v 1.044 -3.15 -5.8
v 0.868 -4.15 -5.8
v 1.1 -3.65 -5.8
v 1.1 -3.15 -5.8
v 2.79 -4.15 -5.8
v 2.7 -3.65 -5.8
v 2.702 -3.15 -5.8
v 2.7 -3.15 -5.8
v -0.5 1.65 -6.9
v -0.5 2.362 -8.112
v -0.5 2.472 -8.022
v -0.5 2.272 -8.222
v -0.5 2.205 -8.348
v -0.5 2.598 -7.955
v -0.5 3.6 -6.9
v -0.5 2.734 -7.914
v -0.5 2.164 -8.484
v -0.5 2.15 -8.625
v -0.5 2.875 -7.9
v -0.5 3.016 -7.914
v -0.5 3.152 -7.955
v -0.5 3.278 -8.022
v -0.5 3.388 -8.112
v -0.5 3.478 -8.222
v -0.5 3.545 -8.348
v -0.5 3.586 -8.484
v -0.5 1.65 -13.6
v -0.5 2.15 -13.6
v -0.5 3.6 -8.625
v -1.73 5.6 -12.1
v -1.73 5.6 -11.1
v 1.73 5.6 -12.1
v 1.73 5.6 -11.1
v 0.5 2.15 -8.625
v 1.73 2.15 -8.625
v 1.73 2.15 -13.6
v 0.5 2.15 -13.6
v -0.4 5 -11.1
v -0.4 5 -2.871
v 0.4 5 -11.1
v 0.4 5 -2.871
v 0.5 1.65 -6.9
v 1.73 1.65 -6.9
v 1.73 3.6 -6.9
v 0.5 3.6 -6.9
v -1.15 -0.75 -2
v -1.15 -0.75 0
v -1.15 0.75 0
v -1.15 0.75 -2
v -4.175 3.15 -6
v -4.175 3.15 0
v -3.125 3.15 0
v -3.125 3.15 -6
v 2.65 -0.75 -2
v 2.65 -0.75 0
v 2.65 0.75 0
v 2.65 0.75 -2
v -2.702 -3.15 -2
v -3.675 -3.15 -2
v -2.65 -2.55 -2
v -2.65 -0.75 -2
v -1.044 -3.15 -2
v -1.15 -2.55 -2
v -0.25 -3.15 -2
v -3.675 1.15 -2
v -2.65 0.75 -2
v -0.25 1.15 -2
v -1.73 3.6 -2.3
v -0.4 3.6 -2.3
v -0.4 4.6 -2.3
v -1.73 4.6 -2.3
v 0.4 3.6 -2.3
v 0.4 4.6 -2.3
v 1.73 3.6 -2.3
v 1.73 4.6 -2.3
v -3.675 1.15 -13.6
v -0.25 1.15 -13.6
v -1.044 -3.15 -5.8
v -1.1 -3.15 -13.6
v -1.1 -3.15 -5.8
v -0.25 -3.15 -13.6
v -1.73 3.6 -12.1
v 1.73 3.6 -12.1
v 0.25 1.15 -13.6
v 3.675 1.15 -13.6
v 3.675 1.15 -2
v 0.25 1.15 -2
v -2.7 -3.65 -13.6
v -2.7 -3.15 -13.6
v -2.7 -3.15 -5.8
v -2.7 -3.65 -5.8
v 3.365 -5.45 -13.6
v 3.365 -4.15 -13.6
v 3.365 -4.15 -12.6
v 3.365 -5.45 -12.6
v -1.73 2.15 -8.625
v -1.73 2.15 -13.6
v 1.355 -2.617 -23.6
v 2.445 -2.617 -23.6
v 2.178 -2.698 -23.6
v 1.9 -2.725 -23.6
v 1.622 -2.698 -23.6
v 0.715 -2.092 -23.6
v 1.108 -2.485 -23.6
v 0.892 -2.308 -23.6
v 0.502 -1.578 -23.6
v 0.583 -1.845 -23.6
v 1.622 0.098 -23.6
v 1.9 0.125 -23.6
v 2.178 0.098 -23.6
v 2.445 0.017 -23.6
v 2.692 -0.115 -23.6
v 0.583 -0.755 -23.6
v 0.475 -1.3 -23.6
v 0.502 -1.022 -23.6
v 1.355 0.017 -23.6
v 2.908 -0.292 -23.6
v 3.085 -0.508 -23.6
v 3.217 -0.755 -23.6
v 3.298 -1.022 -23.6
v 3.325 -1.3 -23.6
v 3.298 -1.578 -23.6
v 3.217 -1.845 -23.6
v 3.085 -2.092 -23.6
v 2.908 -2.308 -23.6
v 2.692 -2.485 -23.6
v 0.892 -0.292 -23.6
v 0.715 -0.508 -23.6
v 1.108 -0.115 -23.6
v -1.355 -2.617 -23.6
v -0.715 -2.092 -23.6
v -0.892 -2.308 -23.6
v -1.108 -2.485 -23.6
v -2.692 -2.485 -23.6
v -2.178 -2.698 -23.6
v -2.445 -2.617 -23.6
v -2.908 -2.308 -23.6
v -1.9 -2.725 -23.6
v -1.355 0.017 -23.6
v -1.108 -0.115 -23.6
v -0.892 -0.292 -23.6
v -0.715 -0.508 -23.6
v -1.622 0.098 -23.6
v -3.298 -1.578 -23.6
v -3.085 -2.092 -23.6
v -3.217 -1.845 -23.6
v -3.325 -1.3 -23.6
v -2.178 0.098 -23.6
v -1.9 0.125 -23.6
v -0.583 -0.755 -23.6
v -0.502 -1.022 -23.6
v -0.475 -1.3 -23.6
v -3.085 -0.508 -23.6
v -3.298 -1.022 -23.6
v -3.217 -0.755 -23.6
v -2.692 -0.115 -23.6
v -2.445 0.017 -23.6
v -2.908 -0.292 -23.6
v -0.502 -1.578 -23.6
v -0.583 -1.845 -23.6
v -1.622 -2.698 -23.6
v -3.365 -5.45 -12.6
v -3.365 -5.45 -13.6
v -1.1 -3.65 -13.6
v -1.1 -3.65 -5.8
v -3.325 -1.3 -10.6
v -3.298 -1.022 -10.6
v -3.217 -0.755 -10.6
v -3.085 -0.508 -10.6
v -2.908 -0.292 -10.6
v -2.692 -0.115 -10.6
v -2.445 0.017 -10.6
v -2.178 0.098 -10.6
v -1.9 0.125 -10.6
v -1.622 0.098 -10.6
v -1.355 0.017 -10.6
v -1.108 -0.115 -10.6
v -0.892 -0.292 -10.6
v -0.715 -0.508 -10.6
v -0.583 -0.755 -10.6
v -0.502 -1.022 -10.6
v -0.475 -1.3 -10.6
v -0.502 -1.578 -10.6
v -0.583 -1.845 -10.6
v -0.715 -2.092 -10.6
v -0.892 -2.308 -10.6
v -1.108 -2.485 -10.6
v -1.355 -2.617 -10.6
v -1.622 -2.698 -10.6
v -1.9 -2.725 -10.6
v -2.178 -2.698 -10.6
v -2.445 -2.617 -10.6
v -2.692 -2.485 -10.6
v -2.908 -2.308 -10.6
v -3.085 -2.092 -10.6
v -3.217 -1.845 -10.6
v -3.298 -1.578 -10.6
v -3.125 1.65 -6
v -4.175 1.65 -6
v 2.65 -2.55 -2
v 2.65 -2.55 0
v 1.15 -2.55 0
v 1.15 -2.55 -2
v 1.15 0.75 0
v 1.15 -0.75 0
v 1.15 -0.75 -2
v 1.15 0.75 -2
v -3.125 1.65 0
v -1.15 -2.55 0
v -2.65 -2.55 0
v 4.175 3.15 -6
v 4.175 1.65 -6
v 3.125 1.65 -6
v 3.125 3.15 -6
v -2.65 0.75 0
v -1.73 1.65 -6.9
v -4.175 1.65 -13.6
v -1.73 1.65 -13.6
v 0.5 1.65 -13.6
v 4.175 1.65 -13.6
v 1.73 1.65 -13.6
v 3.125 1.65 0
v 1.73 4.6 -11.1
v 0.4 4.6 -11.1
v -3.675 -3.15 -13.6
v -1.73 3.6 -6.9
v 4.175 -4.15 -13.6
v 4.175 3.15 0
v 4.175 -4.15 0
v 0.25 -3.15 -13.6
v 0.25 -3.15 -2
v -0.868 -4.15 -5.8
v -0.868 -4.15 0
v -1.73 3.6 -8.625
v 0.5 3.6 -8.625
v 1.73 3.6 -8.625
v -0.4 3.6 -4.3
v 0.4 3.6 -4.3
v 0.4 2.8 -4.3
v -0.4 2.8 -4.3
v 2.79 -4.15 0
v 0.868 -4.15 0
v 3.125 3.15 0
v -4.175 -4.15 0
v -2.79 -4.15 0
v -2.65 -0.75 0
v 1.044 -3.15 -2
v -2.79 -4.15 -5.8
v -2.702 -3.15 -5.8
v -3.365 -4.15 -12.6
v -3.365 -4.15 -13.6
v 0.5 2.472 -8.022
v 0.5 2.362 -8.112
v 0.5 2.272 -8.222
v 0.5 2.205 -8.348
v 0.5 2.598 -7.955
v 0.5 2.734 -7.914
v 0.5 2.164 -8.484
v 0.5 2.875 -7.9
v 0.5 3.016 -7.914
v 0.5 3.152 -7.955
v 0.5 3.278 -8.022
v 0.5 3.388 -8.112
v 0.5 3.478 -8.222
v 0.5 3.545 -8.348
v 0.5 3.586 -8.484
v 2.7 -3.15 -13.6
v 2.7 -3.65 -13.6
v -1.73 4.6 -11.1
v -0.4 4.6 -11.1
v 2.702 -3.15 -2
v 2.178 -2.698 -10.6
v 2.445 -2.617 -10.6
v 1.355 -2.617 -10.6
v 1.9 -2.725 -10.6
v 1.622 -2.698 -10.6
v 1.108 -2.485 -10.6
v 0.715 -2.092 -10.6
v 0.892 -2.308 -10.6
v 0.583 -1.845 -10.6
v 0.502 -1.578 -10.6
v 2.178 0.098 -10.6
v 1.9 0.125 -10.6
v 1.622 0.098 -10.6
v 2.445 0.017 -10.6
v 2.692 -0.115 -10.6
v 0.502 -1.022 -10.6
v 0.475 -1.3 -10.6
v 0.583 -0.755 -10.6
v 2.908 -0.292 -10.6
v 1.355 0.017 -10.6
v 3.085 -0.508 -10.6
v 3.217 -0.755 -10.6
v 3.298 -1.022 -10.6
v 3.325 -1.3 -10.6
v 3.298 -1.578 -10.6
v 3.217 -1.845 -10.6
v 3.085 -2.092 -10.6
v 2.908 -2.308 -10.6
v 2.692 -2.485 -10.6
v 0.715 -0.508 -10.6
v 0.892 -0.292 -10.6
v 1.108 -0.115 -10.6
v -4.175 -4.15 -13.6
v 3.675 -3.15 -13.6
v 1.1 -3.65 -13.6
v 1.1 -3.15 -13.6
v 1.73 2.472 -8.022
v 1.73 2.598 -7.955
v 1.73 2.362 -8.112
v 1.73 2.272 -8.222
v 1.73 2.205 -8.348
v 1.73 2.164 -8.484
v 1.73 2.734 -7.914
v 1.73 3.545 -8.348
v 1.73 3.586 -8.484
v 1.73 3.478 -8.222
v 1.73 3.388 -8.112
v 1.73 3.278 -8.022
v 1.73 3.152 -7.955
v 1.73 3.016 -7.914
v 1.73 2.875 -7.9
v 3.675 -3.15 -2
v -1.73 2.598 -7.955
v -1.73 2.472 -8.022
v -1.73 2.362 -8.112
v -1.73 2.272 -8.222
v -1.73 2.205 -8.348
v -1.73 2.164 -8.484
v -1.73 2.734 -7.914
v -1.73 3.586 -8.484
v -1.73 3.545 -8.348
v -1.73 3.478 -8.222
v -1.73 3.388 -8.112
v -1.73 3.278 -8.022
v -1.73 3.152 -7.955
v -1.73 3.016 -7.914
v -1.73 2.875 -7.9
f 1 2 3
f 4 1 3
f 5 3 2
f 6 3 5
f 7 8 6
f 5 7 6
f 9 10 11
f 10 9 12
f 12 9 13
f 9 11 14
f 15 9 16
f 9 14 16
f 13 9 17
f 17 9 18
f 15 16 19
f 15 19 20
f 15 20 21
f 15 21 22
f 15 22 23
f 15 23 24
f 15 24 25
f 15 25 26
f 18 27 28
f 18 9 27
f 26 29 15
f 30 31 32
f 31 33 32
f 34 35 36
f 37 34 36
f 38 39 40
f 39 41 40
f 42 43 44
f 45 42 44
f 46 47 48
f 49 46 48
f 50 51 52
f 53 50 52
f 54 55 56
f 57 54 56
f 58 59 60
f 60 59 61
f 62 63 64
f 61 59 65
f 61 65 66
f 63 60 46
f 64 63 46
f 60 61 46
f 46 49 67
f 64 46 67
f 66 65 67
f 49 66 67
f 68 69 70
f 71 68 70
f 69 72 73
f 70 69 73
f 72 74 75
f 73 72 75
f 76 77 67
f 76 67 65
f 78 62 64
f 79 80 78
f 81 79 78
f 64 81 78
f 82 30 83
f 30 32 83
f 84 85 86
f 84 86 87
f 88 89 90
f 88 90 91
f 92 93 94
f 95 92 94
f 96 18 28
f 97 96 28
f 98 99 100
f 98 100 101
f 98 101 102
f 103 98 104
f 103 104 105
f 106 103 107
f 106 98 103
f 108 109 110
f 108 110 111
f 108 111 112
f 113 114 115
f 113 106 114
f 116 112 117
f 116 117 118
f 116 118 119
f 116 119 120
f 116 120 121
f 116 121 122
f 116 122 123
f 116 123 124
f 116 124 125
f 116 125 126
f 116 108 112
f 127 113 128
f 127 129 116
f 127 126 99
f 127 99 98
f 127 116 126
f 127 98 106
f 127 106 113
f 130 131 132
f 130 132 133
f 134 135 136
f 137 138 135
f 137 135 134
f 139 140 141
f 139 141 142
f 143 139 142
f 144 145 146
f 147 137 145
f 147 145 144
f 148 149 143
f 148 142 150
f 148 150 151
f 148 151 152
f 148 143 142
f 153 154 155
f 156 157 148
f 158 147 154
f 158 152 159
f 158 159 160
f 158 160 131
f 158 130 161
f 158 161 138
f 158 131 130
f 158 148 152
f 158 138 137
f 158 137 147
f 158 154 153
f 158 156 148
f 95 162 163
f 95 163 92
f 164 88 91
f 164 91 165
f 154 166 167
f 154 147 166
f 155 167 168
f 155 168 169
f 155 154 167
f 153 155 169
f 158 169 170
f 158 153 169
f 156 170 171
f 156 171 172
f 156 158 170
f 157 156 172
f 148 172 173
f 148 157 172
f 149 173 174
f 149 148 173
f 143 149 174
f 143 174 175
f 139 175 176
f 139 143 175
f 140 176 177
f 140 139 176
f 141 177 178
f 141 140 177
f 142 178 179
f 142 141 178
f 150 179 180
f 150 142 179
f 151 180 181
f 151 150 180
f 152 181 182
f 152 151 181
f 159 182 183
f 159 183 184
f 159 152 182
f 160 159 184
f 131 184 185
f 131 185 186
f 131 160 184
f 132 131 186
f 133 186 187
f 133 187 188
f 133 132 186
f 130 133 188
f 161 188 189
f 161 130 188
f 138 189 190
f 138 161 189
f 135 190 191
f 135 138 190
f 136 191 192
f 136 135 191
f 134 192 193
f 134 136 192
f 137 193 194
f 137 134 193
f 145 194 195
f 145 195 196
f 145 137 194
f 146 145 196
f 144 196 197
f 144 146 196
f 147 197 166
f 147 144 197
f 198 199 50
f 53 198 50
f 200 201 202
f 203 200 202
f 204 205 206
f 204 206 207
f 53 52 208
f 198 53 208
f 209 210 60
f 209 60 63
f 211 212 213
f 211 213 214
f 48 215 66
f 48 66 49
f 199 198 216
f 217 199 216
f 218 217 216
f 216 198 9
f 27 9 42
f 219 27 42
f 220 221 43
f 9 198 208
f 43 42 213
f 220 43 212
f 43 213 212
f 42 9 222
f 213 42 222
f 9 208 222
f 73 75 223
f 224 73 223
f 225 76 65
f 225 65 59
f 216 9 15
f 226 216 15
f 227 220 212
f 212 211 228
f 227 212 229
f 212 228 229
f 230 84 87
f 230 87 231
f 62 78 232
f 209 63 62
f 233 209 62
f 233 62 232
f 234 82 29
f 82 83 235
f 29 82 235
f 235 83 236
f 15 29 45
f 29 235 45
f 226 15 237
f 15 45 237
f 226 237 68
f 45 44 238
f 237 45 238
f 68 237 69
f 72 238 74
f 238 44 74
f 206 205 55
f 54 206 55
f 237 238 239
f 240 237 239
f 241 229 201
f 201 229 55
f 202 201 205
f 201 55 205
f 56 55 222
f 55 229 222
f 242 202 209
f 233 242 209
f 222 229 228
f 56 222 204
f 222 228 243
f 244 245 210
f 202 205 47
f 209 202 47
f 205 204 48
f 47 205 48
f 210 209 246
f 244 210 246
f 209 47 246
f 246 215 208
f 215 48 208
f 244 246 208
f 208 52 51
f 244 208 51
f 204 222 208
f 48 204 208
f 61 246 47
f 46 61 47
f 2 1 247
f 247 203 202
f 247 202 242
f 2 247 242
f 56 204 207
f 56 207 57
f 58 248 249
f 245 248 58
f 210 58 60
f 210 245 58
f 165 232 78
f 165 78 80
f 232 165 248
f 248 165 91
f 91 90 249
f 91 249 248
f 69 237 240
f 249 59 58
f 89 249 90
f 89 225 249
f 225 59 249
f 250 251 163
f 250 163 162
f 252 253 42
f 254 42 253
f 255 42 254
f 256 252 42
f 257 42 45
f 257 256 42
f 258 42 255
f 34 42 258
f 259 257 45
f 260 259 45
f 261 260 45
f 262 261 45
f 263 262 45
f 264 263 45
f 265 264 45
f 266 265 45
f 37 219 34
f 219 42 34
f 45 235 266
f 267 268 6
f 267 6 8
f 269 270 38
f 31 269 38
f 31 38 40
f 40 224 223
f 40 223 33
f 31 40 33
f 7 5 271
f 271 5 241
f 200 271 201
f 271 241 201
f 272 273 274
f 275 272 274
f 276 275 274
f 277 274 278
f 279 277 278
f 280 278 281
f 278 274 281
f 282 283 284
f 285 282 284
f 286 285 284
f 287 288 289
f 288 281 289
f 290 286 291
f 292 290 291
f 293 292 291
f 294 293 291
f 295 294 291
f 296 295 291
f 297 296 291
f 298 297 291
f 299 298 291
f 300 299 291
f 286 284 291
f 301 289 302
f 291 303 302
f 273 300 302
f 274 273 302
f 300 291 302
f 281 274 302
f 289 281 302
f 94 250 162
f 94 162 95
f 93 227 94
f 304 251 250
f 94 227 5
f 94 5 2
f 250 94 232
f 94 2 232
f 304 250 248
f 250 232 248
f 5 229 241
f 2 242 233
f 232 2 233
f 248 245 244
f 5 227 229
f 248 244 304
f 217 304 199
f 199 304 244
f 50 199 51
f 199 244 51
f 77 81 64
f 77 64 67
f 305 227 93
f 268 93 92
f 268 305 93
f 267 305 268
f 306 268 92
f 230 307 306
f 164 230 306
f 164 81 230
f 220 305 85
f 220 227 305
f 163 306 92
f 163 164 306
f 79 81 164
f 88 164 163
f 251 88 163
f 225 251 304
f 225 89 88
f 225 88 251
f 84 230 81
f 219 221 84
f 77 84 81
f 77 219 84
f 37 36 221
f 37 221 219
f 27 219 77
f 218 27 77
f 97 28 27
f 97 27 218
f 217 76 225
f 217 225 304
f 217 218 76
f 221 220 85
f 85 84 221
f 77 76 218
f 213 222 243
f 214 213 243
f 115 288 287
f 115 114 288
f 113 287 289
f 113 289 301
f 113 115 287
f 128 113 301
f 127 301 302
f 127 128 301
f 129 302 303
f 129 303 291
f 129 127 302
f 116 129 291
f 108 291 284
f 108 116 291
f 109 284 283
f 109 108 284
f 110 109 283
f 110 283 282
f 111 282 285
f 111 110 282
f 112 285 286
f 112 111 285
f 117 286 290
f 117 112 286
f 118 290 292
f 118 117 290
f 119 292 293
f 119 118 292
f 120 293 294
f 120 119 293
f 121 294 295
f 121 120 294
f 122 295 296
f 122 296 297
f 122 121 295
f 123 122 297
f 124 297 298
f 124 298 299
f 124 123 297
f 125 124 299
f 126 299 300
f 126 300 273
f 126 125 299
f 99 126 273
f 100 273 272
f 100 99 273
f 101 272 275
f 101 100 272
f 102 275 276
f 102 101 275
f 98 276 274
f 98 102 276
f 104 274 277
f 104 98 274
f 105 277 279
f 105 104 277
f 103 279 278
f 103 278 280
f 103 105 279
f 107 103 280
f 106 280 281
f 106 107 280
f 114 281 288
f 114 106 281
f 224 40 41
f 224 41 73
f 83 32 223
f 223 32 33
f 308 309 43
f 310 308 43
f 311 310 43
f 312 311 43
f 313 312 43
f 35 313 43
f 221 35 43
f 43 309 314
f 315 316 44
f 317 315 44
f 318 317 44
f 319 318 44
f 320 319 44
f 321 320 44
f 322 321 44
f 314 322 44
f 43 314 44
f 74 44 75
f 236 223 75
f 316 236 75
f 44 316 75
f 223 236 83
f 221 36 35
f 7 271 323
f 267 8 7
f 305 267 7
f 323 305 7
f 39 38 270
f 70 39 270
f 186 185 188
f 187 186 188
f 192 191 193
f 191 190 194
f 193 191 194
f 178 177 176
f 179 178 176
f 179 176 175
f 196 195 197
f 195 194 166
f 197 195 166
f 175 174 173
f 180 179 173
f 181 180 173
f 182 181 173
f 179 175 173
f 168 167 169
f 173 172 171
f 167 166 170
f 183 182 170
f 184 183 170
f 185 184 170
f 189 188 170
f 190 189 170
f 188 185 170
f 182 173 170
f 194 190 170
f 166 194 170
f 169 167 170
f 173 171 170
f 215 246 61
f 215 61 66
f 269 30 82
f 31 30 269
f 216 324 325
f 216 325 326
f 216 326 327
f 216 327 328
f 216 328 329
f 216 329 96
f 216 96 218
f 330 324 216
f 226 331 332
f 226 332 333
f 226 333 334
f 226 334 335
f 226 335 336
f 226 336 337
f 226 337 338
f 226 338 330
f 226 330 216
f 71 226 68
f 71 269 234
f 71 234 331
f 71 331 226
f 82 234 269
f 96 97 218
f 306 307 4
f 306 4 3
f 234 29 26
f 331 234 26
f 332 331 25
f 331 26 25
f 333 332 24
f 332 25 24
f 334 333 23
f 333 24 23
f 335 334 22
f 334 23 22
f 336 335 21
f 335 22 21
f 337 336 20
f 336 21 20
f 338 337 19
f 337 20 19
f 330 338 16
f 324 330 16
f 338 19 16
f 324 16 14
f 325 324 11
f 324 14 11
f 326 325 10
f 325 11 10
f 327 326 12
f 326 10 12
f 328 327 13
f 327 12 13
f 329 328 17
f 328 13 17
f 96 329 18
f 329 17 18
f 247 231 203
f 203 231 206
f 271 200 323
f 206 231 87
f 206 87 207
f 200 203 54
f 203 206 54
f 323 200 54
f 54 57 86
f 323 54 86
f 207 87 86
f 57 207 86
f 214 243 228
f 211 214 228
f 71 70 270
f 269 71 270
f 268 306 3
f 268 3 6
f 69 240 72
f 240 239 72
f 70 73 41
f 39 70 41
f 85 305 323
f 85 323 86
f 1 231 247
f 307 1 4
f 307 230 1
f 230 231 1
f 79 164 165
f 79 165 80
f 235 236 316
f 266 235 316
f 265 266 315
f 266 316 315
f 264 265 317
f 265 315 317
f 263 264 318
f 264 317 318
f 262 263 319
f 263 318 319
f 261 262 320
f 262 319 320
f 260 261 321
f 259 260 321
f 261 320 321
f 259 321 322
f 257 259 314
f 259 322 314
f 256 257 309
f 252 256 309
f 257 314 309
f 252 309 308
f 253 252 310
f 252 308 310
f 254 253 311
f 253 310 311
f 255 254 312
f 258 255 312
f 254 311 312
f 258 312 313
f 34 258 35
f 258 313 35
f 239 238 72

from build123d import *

# Parameters (mm, degrees)
ESQUISSE1_W               = 1.5
ESQUISSE1_H               = 1.5
BOSS_EXTRU_1_DEPTH        = 13.6
BOSS_EXTRU_2_DEPTH        = 1.73
BOSS_EXTRU_3_DEPTH        = 0.4
BOSS_EXTRU_4_DEPTH        = 0.4
ESQUISSE5_W               = 1
ESQUISSE5_H               = 1.95
ENL_V_MAT_EXTRU_1_DEPTH   = 6.7
ESQUISSE6_W               = 6.73
ESQUISSE6_H               = 1
BOSS_EXTRU_5_DEPTH        = 1.3
ESQUISSE8_W               = 7.6
ESQUISSE8_H               = 1.5
ENL_V_MAT_EXTRU_3_DEPTH   = 1.1
ENL_V_MAT_EXTRU_2_DEPTH   = 11.6
ENL_V_MAT_EXTRU_4_DEPTH   = 5.8
ESQUISSE11_R              = 1.425
BOSS_EXTRU_6_DEPTH        = 10
BOSS_EXTRU_6_DEPTH_BACK   = 3
BOSS_EXTRU_6_2_DEPTH      = 10
BOSS_EXTRU_6_2_DEPTH_BACK = 3


with BuildPart() as part:
    # Esquisse1 → Boss.-Extru.1 (new body)
    with BuildSketch(Plane.XY):
        Polygon((-4.175, 3.15), (-3.125, 3.15), (-3.125, 1.65), (3.125, 1.65), (3.125, 3.15), (4.175, 3.15), (4.175, -4.15), (-4.175, -4.15), align=None)
        with Locations((-1.9, 0)):
            Rectangle(ESQUISSE1_W, ESQUISSE1_H, mode=Mode.SUBTRACT)
        with Locations((1.9, 0)):
            Rectangle(ESQUISSE1_W, ESQUISSE1_H, mode=Mode.SUBTRACT)
    extrude(amount=-BOSS_EXTRU_1_DEPTH)

    # Esquisse2 → Boss.-Extru.2 (add, symmetric)
    with BuildSketch(Plane(origin=(0, 0, 0), x_dir=(0, 0, -1), z_dir=(1, 0, 0))):
        with BuildLine():
            Line((2.3, 4.6), (11.1, 4.6))
            Line((11.1, 4.6), (11.1, 5.6))
            Line((11.1, 5.6), (12.1, 5.6))
            Line((12.1, 5.6), (12.1, 3.6))
            Line((12.1, 3.6), (8.625, 3.6))
            ThreePointArc((8.625, 3.6), (7.9, 2.875), (8.625, 2.15))
            Line((8.625, 2.15), (13.6, 2.15))
            Line((13.6, 2.15), (13.6, 1.65))
            Line((13.6, 1.65), (6.9, 1.65))
            Line((6.9, 1.65), (6.9, 3.6))
            Line((6.9, 3.6), (2.3, 3.6))
            Line((2.3, 3.6), (2.3, 4.6))
        make_face()
    extrude(amount=BOSS_EXTRU_2_DEPTH, both=True)

    # Esquisse3 → Boss.-Extru.3 (add, symmetric)
    with BuildSketch(Plane(origin=(0, 0, 0), x_dir=(0, 0, -1), z_dir=(1, 0, 0))):
        Polygon((2.3, 4.6), (2.871259203, 5), (11.1, 5), (11.1, 4.6), align=None)
    extrude(amount=BOSS_EXTRU_3_DEPTH, both=True)

    # Esquisse4 → Boss.-Extru.4 (add, symmetric)
    with BuildSketch(Plane(origin=(0, 0, 0), x_dir=(0, 0, -1), z_dir=(1, 0, 0))):
        Polygon((4.3, 3.6), (4.3, 2.8), (2.3, 3.6), align=None)
    extrude(amount=BOSS_EXTRU_4_DEPTH, both=True)

    # Esquisse5 → Enlèv. mat.-Extru.1 (cut)
    with BuildSketch(Plane(origin=(0, 0, -13.6), x_dir=(-1, 0, 0), z_dir=(0, 0, -1))):
        with Locations((0, 2.625)):
            Rectangle(ESQUISSE5_W, ESQUISSE5_H)
    extrude(amount=-ENL_V_MAT_EXTRU_1_DEPTH, mode=Mode.SUBTRACT)

    # Esquisse6 → Boss.-Extru.5 (add)
    with BuildSketch(Plane.XZ.offset(4.15)):
        with Locations((0, -13.1)):
            Rectangle(ESQUISSE6_W, ESQUISSE6_H)
    extrude(amount=BOSS_EXTRU_5_DEPTH)

    # Esquisse8 → Enlèv. mat.-Extru.3 (cut)
    with BuildSketch(Plane(origin=(4.175, 0, 0), x_dir=(0, 0, -1), z_dir=(1, 0, 0))):
        with Locations((9.8, 2.4)):
            Rectangle(ESQUISSE8_W, ESQUISSE8_H)
    enl_v_mat_extru_3 = extrude(amount=-ENL_V_MAT_EXTRU_3_DEPTH, mode=Mode.SUBTRACT)

    # Symétrie1: Enlèv. mat.-Extru.3 across plane
    add(enl_v_mat_extru_3.mirror(Plane(origin=(0, 0, 0), x_dir=(0, 0, 1), z_dir=(1, 0, 0))), mode=Mode.SUBTRACT)

    # Esquisse7 → Enlèv. mat.-Extru.2 (cut)
    with BuildSketch(Plane(origin=(0, 0, -13.6), x_dir=(-1, 0, 0), z_dir=(0, 0, -1))):
        Polygon((-3.675, 1.15), (-0.25, 1.15), (-0.25, -3.15), (-1.1, -3.15), (-1.1, -3.65), (-2.7, -3.65), (-2.7, -3.15), (-3.675, -3.15), align=None)
        Polygon((3.675, 1.15), (3.675, -3.15), (2.7, -3.15), (2.7, -3.65), (1.1, -3.65), (1.1, -3.15), (0.25, -3.15), (0.25, 1.15), align=None)
    extrude(amount=-ENL_V_MAT_EXTRU_2_DEPTH, mode=Mode.SUBTRACT)

    # Esquisse10 → Enlèv. mat.-Extru.4 (cut)
    with BuildSketch(Plane.XY):
        Polygon((2.789981862, -4.15), (2.65, -2.55), (1.15, -2.55), (0.867876831, -4.15), align=None)
        Polygon((-0.867876831, -4.15), (-2.789981862, -4.15), (-2.65, -2.55), (-1.15, -2.55), align=None)
    extrude(amount=-ENL_V_MAT_EXTRU_4_DEPTH, mode=Mode.SUBTRACT)


with BuildPart() as body_2:
    # Esquisse11 → Boss.-Extru.6 (new body, two sides)
    with BuildSketch(Plane(origin=(0, 0, -13.6), x_dir=(-1, 0, 0), z_dir=(0, 0, -1))) as boss_extru_6_sk:
        with Locations((-1.9, -1.3)):
            Circle(ESQUISSE11_R)
    extrude(amount=BOSS_EXTRU_6_DEPTH)
    extrude(boss_extru_6_sk.sketch, amount=-BOSS_EXTRU_6_DEPTH_BACK)


with BuildPart() as body_3:
    # Esquisse11 → Boss.-Extru.6 2 (new body, two sides)
    with BuildSketch(Plane(origin=(0, 0, -13.6), x_dir=(-1, 0, 0), z_dir=(0, 0, -1))) as boss_extru_6_2_sk:
        with Locations((1.9, -1.3)):
            Circle(ESQUISSE11_R)
    extrude(amount=BOSS_EXTRU_6_2_DEPTH)
    extrude(boss_extru_6_2_sk.sketch, amount=-BOSS_EXTRU_6_2_DEPTH_BACK)


solid = Compound([part.part, body_2.part, body_3.part])
